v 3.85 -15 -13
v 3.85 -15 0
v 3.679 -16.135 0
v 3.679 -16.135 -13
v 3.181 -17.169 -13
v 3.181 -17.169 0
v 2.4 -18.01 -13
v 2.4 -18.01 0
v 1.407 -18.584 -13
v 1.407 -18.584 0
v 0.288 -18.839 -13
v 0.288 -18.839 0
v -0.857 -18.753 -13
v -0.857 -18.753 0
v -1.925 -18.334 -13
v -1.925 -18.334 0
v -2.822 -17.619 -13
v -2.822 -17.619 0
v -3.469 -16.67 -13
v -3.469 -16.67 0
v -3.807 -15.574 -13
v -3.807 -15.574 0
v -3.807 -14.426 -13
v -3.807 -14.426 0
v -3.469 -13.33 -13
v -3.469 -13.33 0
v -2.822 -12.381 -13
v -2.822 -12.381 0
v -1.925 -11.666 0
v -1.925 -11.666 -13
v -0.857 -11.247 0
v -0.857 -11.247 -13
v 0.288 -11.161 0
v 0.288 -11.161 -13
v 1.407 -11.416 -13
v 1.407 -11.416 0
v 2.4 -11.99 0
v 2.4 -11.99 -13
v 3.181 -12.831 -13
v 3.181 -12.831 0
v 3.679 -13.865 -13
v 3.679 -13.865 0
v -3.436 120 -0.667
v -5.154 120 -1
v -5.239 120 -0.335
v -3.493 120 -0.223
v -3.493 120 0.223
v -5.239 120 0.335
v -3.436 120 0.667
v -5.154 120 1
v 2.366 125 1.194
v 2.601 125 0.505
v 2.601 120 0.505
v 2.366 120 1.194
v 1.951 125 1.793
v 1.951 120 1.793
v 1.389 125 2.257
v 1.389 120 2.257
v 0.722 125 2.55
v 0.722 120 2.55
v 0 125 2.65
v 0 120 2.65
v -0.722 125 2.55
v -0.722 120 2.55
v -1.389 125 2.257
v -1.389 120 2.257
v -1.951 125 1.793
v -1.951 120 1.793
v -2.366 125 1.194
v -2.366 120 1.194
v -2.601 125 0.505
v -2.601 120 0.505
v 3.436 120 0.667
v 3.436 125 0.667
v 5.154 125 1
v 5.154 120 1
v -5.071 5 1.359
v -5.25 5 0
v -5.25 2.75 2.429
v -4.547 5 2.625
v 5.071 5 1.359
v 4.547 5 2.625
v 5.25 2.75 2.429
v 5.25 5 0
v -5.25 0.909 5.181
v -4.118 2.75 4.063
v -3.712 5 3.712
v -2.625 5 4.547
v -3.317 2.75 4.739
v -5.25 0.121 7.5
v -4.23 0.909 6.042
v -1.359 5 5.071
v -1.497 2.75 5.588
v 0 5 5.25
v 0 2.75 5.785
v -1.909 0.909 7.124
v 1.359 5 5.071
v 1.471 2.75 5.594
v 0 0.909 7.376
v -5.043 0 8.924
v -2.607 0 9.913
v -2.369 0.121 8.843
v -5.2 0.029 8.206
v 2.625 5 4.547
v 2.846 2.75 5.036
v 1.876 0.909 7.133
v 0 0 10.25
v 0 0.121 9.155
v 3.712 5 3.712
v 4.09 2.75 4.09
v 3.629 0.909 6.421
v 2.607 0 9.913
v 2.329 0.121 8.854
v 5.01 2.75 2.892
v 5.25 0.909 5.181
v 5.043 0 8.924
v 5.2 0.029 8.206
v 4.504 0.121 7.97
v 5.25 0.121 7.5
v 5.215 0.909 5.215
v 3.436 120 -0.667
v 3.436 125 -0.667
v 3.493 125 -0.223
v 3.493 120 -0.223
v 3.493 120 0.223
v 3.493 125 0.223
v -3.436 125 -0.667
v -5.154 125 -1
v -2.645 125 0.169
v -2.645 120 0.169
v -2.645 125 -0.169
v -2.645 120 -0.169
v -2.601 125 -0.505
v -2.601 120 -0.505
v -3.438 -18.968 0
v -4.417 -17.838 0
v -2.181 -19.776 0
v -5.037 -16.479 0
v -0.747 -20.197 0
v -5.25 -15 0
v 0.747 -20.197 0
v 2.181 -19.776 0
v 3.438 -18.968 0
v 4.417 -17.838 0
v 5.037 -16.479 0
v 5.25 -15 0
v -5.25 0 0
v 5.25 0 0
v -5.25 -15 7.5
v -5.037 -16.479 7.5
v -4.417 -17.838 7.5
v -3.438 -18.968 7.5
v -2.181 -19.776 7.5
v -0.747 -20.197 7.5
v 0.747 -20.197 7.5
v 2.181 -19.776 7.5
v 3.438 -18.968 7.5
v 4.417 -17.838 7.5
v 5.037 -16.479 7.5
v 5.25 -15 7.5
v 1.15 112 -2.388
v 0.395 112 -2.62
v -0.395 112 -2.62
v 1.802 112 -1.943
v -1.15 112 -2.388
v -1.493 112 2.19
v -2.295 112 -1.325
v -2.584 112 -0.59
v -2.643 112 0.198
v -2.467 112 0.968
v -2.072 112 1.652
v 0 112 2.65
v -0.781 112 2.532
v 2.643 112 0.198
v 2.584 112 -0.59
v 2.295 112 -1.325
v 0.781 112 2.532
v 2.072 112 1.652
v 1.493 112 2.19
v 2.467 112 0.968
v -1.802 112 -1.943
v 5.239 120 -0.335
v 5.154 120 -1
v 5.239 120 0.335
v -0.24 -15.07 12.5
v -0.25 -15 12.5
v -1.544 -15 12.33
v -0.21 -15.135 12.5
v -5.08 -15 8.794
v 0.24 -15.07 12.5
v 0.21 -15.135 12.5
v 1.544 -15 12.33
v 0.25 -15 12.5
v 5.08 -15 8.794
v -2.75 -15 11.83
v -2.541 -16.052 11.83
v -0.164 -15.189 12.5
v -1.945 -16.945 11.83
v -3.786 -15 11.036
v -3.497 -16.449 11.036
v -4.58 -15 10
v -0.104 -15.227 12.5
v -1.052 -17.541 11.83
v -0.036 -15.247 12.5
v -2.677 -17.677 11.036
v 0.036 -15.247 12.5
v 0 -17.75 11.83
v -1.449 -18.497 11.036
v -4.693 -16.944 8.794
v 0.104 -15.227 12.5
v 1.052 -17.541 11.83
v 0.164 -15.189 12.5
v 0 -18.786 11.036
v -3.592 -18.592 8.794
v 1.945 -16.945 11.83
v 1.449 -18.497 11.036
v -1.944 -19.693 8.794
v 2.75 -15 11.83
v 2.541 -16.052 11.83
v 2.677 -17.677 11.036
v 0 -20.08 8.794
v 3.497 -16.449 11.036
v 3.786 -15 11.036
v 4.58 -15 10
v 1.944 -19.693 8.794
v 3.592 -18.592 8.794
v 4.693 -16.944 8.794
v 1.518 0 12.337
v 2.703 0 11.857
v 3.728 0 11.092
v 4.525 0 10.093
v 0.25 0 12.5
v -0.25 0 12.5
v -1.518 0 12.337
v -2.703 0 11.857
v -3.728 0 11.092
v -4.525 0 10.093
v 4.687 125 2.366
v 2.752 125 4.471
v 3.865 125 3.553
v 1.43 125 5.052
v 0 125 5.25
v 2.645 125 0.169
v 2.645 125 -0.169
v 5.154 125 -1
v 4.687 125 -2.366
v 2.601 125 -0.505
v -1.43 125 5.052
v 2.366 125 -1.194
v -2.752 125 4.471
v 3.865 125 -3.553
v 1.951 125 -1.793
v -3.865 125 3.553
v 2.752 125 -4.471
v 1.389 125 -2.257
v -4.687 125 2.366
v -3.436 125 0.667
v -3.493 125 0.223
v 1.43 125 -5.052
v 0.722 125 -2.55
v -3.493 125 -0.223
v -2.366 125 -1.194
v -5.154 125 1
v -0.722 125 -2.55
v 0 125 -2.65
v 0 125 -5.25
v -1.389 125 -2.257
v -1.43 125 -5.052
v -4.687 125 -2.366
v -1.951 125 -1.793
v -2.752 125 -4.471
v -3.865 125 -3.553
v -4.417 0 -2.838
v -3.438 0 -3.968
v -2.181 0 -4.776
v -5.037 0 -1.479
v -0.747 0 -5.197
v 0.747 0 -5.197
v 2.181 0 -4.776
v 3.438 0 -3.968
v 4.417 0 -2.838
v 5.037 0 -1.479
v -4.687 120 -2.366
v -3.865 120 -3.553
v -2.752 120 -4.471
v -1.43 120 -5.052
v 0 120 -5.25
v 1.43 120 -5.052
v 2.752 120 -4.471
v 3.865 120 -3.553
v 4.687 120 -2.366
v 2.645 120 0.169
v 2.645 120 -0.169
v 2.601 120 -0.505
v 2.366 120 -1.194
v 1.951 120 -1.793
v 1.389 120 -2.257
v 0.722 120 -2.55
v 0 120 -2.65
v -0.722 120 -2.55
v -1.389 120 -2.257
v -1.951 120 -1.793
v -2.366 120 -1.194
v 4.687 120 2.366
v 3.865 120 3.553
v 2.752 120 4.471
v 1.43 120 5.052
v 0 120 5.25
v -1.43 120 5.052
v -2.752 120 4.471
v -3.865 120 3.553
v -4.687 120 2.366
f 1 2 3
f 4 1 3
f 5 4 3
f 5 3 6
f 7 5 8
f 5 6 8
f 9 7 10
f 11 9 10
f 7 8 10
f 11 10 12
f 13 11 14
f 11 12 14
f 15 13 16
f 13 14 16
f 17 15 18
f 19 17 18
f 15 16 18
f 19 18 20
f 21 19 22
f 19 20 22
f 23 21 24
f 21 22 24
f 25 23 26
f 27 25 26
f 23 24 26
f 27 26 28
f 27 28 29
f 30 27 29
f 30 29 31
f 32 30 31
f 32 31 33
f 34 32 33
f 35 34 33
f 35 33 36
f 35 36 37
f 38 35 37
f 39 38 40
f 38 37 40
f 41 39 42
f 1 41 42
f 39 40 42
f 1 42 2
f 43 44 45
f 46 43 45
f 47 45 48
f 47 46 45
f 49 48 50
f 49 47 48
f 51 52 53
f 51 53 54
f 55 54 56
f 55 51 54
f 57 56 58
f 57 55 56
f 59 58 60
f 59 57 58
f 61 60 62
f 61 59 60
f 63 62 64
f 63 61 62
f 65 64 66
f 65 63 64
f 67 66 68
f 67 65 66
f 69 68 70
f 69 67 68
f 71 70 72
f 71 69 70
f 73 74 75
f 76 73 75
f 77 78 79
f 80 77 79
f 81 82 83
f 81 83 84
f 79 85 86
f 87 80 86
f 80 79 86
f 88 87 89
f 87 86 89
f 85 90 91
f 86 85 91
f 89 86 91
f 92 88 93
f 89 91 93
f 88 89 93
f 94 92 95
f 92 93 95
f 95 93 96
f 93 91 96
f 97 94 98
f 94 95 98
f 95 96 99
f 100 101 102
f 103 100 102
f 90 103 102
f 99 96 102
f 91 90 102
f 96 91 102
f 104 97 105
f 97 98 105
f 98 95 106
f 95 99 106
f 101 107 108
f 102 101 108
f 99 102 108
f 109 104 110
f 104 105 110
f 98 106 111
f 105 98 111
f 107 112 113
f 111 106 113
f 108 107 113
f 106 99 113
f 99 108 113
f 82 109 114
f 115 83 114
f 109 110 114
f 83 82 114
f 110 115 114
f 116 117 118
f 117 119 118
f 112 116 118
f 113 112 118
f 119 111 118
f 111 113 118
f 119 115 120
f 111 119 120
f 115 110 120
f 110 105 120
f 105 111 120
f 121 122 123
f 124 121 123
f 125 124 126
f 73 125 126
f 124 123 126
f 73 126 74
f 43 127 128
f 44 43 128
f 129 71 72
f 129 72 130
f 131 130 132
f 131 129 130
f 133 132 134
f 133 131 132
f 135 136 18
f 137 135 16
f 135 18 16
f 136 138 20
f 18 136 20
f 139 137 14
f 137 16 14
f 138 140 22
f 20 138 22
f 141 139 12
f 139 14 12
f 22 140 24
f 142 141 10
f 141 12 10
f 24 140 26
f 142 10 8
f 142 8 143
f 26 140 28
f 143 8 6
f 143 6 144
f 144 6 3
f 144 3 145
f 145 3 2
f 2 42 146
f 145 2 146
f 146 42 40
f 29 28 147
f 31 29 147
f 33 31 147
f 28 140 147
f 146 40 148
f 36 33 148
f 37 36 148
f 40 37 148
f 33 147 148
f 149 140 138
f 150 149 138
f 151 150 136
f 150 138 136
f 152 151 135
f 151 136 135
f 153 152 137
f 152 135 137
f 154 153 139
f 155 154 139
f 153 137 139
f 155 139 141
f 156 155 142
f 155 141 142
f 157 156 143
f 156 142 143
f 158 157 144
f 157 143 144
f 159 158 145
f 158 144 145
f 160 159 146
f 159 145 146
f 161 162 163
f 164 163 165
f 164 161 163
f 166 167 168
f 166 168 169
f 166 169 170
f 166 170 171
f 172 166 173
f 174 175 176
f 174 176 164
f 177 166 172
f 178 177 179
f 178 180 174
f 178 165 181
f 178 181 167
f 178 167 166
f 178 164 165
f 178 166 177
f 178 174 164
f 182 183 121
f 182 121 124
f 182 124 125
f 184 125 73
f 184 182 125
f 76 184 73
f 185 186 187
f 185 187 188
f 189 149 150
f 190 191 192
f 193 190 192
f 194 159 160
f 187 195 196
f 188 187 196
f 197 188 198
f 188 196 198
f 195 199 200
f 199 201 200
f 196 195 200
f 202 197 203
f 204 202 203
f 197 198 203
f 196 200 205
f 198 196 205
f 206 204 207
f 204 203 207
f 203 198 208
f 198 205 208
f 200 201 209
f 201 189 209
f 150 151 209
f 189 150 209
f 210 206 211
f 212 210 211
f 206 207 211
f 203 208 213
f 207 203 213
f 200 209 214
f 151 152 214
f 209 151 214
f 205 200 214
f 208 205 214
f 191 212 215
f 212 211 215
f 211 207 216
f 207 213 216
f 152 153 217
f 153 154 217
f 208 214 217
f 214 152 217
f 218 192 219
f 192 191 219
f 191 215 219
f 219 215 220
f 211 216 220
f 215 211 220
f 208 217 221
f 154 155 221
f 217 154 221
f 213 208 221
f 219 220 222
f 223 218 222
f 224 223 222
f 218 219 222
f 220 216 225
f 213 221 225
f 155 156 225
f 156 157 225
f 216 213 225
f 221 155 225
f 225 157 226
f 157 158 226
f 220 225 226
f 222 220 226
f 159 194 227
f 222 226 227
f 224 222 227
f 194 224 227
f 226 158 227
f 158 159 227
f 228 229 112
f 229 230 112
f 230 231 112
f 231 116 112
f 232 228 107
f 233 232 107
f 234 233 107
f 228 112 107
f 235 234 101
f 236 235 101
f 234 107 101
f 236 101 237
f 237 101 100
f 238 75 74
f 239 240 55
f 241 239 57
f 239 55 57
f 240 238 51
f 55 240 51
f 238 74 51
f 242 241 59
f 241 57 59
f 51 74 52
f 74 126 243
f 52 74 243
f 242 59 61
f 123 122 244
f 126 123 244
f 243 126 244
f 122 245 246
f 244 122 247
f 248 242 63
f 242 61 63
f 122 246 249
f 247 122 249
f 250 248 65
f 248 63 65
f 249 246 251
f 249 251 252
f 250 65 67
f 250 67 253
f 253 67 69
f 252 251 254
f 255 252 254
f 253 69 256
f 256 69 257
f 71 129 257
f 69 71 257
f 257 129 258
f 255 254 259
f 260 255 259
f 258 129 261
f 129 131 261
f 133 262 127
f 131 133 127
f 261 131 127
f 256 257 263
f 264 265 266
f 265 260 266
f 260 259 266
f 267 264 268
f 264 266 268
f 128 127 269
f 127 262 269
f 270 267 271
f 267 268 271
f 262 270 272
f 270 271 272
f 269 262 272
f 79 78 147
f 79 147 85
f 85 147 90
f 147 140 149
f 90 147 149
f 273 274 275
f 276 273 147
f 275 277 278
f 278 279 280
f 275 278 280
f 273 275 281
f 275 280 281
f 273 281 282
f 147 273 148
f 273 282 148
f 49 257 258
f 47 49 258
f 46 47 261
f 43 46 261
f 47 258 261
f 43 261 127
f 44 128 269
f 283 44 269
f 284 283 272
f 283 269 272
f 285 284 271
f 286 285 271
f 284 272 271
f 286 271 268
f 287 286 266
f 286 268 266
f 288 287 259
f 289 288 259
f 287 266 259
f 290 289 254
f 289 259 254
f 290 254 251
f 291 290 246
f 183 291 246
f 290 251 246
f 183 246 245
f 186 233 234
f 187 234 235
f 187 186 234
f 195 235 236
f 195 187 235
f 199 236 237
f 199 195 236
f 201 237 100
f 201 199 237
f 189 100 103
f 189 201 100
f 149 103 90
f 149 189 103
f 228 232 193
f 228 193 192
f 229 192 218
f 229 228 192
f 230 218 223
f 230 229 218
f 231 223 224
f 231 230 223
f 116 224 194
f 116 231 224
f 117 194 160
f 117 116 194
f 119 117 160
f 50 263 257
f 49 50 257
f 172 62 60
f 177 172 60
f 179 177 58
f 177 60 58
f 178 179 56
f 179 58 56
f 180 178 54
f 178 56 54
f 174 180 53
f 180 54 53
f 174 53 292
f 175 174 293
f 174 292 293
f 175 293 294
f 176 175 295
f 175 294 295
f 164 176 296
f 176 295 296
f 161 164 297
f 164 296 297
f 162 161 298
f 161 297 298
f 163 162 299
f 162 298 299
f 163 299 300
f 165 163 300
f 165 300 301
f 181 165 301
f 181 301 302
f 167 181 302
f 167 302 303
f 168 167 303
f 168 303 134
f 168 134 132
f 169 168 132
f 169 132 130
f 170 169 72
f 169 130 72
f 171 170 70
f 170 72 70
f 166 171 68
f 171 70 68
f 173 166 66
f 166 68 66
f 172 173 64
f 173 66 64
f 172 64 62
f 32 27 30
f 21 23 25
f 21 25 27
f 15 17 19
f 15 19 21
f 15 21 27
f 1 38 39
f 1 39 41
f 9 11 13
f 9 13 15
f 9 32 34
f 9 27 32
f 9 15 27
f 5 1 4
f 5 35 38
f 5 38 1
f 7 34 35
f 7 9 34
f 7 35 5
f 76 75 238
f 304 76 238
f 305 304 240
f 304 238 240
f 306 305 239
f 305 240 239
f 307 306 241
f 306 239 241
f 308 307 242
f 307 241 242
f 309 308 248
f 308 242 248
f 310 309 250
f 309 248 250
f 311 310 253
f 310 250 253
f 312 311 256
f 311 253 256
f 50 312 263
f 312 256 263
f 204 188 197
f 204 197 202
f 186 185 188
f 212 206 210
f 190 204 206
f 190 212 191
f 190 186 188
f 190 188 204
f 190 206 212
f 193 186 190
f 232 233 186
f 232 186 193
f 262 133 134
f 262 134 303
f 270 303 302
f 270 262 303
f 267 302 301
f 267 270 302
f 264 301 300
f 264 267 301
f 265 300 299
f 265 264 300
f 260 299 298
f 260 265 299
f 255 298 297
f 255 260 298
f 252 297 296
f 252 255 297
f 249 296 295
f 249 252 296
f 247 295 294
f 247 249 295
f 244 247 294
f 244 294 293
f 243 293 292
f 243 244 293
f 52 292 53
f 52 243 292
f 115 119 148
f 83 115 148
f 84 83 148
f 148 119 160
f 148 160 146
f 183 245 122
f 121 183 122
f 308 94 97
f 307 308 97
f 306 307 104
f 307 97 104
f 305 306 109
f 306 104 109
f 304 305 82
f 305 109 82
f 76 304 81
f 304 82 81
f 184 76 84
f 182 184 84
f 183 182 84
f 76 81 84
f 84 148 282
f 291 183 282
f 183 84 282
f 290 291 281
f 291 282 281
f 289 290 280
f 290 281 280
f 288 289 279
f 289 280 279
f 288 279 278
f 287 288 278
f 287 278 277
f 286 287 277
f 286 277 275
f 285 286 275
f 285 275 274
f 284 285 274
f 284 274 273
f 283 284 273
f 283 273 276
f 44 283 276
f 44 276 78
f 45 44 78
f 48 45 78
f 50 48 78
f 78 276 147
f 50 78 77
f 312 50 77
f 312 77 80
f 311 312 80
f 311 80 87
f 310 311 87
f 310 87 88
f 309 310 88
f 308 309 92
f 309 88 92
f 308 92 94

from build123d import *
from build123d.topology import SkipClean

# Parameters (mm, degrees)
SKETCH3_R           = 5.25
BOSS_EXTRUDE1_DEPTH = 120
BOSS_EXTRUDE4_DEPTH = 12.5
SKETCH6_R           = 3.85
BOSS_EXTRUDE5_DEPTH = 13
FILLET3_R           = 5
FILLET4_R           = 5
SKETCH7_R           = 2.65
CUT_EXTRUDE1_DEPTH  = 8
BOSS_EXTRUDE6_START = 5
BOSS_EXTRUDE6_DEPTH = 5


with BuildPart() as part:
    # Sketch3 → Boss-Extrude1 (new body)
    with BuildSketch(Plane(origin=(0, 0, 0), x_dir=(1, 0, 0), z_dir=(0, 1, 0))):
        with Locations(Location((0, 0, 0), (0, 0, 270))):
            Circle(SKETCH3_R)
    extrude(amount=BOSS_EXTRUDE1_DEPTH)

    # Sketch4 → Boss-Extrude4 (add)
    with BuildSketch(Plane.XY):
        with BuildLine():
            Line((-5.25, 0), (-5.25, -15))
            ThreePointArc((-5.25, -15), (0, -20.25), (5.25, -15))
            Line((5.25, -15), (5.25, 0))
            Line((5.25, 0), (-5.25, 0))
        make_face()
    extrude(amount=BOSS_EXTRUDE4_DEPTH)

    # Sketch6 → Boss-Extrude5 (add)
    with BuildSketch(Plane(origin=(0, 0, 0), x_dir=(-1, 0, 0), z_dir=(0, 0, -1))):
        with Locations(Location((0, -15, 0), (0, 0, 180))):
            Circle(SKETCH6_R)
    extrude(amount=BOSS_EXTRUDE5_DEPTH)

    # Fillet3
    # the kernel refuses this fillet: 5 mm, written as the material it adds along each edge
    with BuildSketch(Plane(origin=(0, 0, 0), x_dir=(0, 0, 1), z_dir=(-1, 0, 0))) as fillet3_piece_1_section:
        with BuildLine():
            CenterArc((5.25 + FILLET3_R, FILLET3_R), FILLET3_R, 180, 90)
            Line((5.25 + FILLET3_R, 0), (5.25, 0))
            Line((5.25, 0), (5.25, FILLET3_R))
        make_face()
    fillet3_piece_1 = revolve(axis=Axis((0, 0, 0), (0, 1, 0)), revolution_arc=90, mode=Mode.PRIVATE)
    fillet3_piece_1 = split(fillet3_piece_1, bisect_by=Plane(origin=(5.25, 1.168711495, 5.202443702), z_dir=(-1, 0, 0)), keep=Keep.TOP, mode=Mode.PRIVATE)
    add(fillet3_piece_1)
    with BuildSketch(Plane(origin=(0, 0, 0), x_dir=(-1, 0, 0), z_dir=(0, 0, -1))) as fillet3_piece_2_section:
        with BuildLine():
            CenterArc((5.25 + FILLET3_R, FILLET3_R), FILLET3_R, 180, 90)
            Line((5.25 + FILLET3_R, 0), (5.25, 0))
            Line((5.25, 0), (5.25, FILLET3_R))
        make_face()
    fillet3_piece_2 = revolve(axis=Axis((0, 0, 0), (0, 1, 0)), revolution_arc=90, mode=Mode.PRIVATE)
    fillet3_piece_2 = split(fillet3_piece_2, bisect_by=Plane(origin=(-5.25, 1.168711696, 5.202443347), z_dir=(1, 0, 0)), keep=Keep.TOP, mode=Mode.PRIVATE)
    add(fillet3_piece_2)

    # Fillet4
    fillet4_edges = [part.edges().sort_by_distance(p)[0] for p in [
        (5.25, -7.5, 12.5),
        (0, -20.25, 12.5),
        (-5.25, -7.5, 12.5),
    ]]
    fillet(fillet4_edges, radius=FILLET4_R)

    # Sketch7 → Cut-Extrude1 (cut)
    with BuildSketch(Plane(origin=(0, 120, 0), x_dir=(1, 0, 0), z_dir=(0, 1, 0))):
        with Locations(Location((0, 0, 0), (0, 0, 270))):
            Circle(SKETCH7_R)
    extrude(amount=-CUT_EXTRUDE1_DEPTH, mode=Mode.SUBTRACT)

    # Sketch9 → Boss-Extrude6 (add)
    with SkipClean():  # the faces are left unmerged after this step: merging them gives an invalid solid
        with BuildSketch(Plane(origin=(0, 120, 0), x_dir=(1, 0, 0), z_dir=(0, 1, 0)).offset(BOSS_EXTRUDE6_START)):
            with BuildLine():
                Line((-3.435921355, 0.666666667), (-5.153882032, 1))
                ThreePointArc((-5.153882032, 1), (0, 5.25), (5.153882032, 1))
                Line((5.153882032, 1), (3.435921355, 0.666666667))
                ThreePointArc((3.435921355, 0.666666667), (3.5, 0), (3.435921355, -0.666666667))
                Line((3.435921355, -0.666666667), (5.153882032, -1))
                ThreePointArc((5.153882032, -1), (0, -5.25), (-5.153882032, -1))
                Line((-5.153882032, -1), (-3.435921355, -0.666666667))
                ThreePointArc((-3.435921355, -0.666666667), (-3.5, 0), (-3.435921355, 0.666666667))
            make_face()
            with BuildLine():
                ThreePointArc((-2.601483311, 0.504761905), (0, 2.65), (2.601483311, 0.504761905))
                ThreePointArc((2.601483311, 0.504761905), (2.65, 0), (2.601483311, -0.504761905))
                ThreePointArc((2.601483311, -0.504761905), (0, -2.65), (-2.601483311, -0.504761905))
                ThreePointArc((-2.601483311, -0.504761905), (-2.65, 0), (-2.601483311, 0.504761905))
            make_face(mode=Mode.SUBTRACT)
        extrude(amount=-BOSS_EXTRUDE6_DEPTH)


solid = part.part
